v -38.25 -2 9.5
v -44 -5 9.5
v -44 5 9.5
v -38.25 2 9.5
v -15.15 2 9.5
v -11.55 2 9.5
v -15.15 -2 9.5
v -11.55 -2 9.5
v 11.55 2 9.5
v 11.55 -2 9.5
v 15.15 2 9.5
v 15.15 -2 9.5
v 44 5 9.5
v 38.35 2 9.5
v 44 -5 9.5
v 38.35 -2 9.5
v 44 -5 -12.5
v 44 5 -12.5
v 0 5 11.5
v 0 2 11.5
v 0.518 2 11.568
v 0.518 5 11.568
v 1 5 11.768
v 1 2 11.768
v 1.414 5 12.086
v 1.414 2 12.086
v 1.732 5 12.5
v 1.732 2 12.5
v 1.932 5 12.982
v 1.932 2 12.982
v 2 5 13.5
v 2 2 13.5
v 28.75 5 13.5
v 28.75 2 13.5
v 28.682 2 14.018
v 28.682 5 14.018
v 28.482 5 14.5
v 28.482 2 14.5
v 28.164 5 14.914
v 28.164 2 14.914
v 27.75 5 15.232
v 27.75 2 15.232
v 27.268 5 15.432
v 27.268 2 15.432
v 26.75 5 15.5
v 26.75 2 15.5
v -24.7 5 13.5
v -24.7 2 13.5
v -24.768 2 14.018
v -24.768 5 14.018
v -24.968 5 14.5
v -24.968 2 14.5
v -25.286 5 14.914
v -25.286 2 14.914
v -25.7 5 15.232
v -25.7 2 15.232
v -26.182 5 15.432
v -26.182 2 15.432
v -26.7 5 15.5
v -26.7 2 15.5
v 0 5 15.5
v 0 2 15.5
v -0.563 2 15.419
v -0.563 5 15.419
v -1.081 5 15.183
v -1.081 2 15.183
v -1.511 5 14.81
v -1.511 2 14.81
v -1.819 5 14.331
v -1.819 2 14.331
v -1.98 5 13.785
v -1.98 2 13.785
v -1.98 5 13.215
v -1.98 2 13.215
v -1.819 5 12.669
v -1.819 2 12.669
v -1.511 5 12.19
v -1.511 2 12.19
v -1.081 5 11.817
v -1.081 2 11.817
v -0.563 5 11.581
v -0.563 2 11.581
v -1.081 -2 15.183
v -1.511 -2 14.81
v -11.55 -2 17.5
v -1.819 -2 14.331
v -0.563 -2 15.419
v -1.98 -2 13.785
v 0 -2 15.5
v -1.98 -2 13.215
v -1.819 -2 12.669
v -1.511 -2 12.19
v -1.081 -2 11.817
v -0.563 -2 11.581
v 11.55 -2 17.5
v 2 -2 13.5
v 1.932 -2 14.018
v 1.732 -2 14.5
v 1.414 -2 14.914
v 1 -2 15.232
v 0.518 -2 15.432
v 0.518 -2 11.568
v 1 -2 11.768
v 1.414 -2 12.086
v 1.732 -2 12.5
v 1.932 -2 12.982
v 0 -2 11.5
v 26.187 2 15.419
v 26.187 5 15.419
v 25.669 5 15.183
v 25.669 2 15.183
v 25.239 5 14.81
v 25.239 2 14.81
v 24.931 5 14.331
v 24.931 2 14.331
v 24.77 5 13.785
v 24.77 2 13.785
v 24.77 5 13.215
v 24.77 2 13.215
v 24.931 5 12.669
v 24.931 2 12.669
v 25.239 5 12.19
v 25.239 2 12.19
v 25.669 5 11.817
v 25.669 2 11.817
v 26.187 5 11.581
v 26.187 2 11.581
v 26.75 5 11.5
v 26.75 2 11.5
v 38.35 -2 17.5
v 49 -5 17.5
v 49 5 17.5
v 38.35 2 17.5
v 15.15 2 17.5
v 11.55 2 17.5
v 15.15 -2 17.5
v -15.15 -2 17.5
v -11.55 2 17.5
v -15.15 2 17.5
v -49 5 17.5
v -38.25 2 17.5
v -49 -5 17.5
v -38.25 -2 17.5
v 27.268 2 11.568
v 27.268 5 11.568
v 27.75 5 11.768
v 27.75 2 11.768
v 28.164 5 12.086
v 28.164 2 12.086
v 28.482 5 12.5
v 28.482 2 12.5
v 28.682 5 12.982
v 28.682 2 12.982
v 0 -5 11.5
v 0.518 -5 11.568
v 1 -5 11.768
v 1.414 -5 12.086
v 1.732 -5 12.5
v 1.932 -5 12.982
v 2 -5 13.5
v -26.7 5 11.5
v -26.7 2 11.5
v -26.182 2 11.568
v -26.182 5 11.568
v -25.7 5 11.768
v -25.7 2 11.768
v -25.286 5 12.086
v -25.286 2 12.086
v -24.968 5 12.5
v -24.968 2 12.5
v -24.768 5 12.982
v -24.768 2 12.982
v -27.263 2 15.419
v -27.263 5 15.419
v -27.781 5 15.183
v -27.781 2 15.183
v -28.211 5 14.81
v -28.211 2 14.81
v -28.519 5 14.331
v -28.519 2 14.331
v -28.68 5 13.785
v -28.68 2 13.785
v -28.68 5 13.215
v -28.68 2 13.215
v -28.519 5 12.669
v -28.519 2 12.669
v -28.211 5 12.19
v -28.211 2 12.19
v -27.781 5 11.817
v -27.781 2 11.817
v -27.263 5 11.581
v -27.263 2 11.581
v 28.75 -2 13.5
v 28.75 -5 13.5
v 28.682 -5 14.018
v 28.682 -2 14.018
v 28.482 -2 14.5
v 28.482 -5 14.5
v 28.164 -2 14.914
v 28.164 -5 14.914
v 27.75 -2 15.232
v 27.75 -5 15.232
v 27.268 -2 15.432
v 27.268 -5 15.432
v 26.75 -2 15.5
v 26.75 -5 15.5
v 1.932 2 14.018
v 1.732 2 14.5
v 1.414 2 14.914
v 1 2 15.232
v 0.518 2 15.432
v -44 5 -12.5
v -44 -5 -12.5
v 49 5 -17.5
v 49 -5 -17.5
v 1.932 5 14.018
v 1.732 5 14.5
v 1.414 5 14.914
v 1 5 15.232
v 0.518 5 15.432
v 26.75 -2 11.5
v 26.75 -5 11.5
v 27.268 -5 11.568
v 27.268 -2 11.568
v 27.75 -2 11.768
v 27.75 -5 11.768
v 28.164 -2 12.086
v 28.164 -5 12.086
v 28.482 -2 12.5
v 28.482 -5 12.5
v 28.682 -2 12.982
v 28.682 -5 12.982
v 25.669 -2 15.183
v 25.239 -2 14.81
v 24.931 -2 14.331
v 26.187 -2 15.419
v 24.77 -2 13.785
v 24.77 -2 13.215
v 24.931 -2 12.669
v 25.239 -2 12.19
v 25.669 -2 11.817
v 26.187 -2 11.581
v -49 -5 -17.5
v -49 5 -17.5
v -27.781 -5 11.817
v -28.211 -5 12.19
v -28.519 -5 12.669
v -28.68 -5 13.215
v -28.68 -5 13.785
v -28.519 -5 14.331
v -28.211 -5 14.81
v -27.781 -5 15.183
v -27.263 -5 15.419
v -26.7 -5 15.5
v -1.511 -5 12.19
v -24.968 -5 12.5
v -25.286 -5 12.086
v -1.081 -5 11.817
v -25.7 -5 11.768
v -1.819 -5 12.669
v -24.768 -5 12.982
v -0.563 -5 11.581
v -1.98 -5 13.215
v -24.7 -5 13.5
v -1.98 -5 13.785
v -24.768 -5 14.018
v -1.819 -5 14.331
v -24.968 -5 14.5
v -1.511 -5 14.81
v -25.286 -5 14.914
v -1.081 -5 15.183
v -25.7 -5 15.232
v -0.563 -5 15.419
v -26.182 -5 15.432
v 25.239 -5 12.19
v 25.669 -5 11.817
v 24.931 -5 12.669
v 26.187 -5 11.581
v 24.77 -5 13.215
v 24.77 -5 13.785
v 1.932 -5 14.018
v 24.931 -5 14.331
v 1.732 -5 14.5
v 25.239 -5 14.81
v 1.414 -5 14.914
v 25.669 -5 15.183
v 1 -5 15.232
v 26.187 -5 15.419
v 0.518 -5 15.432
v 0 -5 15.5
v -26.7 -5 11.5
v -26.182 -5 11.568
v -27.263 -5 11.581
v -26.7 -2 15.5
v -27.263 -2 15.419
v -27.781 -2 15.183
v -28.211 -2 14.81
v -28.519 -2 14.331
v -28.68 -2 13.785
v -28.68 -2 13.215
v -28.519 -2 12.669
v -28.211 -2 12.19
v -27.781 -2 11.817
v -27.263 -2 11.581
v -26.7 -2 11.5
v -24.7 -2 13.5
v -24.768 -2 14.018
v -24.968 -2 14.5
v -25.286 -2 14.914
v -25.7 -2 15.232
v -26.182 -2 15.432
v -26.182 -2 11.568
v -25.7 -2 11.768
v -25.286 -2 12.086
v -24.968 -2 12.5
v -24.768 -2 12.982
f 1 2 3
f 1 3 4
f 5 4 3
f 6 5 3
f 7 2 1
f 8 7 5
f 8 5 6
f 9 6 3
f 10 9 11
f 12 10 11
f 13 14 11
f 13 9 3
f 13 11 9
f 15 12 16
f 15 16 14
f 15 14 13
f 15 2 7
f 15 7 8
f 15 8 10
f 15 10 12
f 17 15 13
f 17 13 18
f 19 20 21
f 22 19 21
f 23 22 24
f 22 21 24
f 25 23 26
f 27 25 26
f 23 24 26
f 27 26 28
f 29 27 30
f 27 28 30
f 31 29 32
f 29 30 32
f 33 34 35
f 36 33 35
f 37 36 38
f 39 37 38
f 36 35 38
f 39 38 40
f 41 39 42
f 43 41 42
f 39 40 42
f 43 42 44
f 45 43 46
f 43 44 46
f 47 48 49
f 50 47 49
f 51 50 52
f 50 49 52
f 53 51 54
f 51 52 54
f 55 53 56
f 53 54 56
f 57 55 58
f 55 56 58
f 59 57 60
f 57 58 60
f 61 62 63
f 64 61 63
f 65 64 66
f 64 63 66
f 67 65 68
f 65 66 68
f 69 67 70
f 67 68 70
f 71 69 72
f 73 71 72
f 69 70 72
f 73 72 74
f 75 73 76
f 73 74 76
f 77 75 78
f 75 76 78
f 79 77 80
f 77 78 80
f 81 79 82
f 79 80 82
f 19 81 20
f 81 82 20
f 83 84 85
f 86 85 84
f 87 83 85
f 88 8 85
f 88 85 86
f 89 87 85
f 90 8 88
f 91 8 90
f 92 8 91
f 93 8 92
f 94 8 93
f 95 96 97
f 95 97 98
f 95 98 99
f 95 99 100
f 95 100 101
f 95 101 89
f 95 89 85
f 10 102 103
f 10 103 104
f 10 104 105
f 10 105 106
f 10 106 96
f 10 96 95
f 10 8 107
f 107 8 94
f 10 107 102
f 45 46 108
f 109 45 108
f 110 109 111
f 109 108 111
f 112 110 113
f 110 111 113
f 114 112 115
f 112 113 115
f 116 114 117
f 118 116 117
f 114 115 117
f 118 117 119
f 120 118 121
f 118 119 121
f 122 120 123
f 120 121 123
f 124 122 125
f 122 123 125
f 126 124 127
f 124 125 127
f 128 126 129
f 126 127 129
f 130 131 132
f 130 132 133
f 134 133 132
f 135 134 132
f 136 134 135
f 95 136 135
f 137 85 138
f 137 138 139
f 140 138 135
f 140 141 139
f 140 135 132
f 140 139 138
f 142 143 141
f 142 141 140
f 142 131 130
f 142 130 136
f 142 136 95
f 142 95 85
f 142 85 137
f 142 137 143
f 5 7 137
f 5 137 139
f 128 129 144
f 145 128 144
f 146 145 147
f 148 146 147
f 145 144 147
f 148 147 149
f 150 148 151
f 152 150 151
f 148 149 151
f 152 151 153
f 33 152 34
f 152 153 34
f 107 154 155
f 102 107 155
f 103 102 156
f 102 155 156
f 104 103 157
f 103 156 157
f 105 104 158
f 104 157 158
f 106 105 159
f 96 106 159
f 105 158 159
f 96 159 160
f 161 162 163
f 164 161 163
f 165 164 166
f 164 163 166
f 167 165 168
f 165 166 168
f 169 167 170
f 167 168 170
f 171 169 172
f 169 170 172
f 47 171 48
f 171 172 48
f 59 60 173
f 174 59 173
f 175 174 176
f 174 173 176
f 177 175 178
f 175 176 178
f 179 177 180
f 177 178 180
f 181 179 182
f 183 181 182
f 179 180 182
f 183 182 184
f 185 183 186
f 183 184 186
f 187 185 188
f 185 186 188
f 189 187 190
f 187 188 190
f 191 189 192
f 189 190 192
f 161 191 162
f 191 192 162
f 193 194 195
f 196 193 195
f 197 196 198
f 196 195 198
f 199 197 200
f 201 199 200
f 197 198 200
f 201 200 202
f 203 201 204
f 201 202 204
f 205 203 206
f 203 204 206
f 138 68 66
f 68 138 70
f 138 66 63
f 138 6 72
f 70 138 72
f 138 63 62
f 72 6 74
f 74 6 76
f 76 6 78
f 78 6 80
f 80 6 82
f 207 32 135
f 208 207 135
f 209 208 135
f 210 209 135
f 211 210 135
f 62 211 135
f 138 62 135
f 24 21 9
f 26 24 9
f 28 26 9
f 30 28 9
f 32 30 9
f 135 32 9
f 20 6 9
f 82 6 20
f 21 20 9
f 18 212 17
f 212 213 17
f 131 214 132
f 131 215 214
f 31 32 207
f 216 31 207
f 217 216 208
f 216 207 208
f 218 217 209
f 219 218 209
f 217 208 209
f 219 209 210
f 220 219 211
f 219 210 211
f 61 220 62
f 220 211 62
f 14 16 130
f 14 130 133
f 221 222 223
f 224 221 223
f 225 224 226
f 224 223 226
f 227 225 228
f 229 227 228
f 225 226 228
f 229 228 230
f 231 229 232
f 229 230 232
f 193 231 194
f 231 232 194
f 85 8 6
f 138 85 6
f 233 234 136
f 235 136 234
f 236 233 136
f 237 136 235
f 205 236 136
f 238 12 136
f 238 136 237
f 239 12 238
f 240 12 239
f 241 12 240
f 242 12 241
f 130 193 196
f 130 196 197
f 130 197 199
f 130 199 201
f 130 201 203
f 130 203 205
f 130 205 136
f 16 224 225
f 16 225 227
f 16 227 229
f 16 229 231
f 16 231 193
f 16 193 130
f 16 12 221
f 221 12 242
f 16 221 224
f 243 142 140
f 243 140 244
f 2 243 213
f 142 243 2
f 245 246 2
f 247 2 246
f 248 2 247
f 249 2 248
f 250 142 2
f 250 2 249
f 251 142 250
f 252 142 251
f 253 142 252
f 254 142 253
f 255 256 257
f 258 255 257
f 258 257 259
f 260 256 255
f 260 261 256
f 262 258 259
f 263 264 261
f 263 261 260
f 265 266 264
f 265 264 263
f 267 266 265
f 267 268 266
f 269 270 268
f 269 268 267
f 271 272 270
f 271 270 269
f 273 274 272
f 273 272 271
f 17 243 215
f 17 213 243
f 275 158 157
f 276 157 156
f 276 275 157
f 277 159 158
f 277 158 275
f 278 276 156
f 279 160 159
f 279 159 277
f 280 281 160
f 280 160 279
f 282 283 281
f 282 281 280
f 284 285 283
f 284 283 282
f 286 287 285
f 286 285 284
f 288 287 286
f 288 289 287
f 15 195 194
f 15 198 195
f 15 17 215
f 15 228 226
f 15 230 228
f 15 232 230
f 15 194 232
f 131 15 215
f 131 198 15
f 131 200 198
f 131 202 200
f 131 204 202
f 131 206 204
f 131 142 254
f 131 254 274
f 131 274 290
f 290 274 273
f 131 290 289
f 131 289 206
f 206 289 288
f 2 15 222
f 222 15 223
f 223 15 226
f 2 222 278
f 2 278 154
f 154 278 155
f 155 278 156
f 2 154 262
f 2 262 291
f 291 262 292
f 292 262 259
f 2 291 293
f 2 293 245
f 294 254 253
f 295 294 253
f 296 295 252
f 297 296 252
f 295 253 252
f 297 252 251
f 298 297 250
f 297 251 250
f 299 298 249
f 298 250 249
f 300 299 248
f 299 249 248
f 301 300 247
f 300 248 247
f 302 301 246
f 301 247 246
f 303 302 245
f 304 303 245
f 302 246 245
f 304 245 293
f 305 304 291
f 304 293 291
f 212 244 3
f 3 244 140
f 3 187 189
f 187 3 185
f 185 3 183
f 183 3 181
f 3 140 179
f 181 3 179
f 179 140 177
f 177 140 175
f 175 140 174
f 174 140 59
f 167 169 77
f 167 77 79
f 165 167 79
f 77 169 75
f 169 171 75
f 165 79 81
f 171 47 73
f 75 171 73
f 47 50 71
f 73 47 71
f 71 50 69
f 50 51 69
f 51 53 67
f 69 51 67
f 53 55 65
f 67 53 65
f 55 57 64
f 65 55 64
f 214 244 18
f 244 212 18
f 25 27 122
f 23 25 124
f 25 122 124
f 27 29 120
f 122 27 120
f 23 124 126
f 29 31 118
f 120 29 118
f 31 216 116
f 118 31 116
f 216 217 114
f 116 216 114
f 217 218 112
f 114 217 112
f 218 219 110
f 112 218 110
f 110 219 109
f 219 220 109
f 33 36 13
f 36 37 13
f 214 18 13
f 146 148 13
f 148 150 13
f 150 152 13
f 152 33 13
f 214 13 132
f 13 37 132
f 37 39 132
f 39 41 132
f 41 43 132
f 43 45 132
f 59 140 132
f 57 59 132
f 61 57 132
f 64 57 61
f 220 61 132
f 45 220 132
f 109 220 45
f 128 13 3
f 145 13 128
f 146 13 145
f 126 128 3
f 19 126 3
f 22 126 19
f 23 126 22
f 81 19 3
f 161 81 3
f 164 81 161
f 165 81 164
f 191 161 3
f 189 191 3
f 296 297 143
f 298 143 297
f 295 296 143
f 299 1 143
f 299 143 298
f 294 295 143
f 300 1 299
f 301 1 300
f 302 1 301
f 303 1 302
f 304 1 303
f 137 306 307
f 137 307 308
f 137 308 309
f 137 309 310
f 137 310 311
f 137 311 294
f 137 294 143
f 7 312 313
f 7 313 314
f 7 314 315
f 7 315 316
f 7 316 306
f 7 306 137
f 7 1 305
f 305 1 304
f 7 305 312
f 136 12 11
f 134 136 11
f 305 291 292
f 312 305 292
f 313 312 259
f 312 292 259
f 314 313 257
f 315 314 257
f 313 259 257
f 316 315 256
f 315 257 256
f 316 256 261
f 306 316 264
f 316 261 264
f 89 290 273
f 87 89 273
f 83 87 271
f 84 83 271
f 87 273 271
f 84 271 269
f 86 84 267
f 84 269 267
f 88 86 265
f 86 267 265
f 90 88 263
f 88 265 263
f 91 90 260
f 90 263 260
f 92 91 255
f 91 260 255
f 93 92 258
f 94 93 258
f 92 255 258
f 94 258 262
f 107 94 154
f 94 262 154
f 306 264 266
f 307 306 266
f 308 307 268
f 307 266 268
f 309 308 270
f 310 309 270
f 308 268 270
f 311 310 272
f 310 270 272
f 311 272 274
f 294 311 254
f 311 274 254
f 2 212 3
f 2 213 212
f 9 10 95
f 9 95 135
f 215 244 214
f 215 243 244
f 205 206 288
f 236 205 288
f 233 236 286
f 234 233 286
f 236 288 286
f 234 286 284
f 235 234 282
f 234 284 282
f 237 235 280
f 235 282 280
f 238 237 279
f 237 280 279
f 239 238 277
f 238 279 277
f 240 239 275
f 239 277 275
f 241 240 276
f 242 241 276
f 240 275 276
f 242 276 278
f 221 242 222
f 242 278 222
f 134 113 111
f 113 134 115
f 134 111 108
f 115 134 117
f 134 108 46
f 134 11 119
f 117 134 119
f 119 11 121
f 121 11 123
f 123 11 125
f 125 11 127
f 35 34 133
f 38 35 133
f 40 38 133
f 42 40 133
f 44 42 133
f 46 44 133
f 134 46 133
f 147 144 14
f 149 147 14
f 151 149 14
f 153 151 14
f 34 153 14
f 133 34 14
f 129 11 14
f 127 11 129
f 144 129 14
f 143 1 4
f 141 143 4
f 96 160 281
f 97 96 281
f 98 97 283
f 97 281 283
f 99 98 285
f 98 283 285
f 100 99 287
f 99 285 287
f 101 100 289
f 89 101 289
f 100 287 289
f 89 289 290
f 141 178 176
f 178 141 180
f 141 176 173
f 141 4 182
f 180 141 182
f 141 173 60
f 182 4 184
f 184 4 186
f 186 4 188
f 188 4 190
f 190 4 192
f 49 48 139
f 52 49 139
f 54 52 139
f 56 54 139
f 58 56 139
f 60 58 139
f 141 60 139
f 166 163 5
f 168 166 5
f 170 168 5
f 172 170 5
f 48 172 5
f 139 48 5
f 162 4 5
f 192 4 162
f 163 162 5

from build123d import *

# Parameters (mm, degrees)
F0_W     = 88
F0_H     = 5
F1_DEPTH = 5
F2_W     = 23.1
F2_H     = 4
F2_W_2   = 23.2
F3_DEPTH = 17.501
F5_DEPTH = 10.001


# Not quite as in the source:
# - a feature names something its author has since deleted; it is built from what else it names


with BuildPart() as f1:
    # F0 (on Front) → F1 (new body, symmetric)
    with BuildSketch(Plane.XZ):
        Polygon((44, -17.5), (49, -17.5), (49, 17.5), (-49, 17.5), (-49, -17.5), (-44, -17.5), (-44, -12.5), (-44, 9.5), (44, 9.5), (44, -12.5), align=None)
        with Locations((0, -15)):
            Rectangle(F0_W, F0_H)
    extrude(amount=F1_DEPTH, both=True)

    # F2 (on Top) → F3 (cut, through all)
    with BuildSketch(Plane.XY):
        with Locations((-26.7, 0)):
            Rectangle(F2_W, F2_H)
        Rectangle(F2_W, F2_H)
        with Locations((26.75, 0)):
            Rectangle(F2_W_2, F2_H)
    extrude(amount=F3_DEPTH, mode=Mode.SUBTRACT)

    # F4 (on face) → F5 (cut, through all)
    with BuildSketch(Plane.XZ.offset(5)):
        with BuildLine():
            ThreePointArc((-26.7, 15.5), (-28.7, 13.5), (-26.7, 11.5))
            Line((-26.7, 11.5), (-26.7, 15.5))
        make_face()
        with BuildLine():
            Line((-26.7, 15.5), (-26.7, 11.5))
            ThreePointArc((-26.7, 11.5), (-25.2857864376, 12.0857864376), (-24.7, 13.5))
            ThreePointArc((-24.7, 13.5), (-25.2857864376, 14.9142135624), (-26.7, 15.5))
        make_face()
        with BuildLine():
            ThreePointArc((0, 15.5), (-2, 13.5), (0, 11.5))
            Line((0, 11.5), (0, 15.5))
        make_face()
        with BuildLine():
            Line((0, 15.5), (0, 11.5))
            ThreePointArc((0, 11.5), (1.4142135624, 12.0857864376), (2, 13.5))
            ThreePointArc((2, 13.5), (1.4142135624, 14.9142135624), (0, 15.5))
        make_face()
        with BuildLine():
            ThreePointArc((26.75, 15.5), (24.75, 13.5), (26.75, 11.5))
            Line((26.75, 11.5), (26.75, 15.5))
        make_face()
        with BuildLine():
            Line((26.75, 15.5), (26.75, 11.5))
            ThreePointArc((26.75, 11.5), (28.1642135624, 12.0857864376), (28.75, 13.5))
            ThreePointArc((28.75, 13.5), (28.1642135624, 14.9142135624), (26.75, 15.5))
        make_face()
    extrude(amount=-F5_DEPTH, mode=Mode.SUBTRACT)


solid = f1.part
